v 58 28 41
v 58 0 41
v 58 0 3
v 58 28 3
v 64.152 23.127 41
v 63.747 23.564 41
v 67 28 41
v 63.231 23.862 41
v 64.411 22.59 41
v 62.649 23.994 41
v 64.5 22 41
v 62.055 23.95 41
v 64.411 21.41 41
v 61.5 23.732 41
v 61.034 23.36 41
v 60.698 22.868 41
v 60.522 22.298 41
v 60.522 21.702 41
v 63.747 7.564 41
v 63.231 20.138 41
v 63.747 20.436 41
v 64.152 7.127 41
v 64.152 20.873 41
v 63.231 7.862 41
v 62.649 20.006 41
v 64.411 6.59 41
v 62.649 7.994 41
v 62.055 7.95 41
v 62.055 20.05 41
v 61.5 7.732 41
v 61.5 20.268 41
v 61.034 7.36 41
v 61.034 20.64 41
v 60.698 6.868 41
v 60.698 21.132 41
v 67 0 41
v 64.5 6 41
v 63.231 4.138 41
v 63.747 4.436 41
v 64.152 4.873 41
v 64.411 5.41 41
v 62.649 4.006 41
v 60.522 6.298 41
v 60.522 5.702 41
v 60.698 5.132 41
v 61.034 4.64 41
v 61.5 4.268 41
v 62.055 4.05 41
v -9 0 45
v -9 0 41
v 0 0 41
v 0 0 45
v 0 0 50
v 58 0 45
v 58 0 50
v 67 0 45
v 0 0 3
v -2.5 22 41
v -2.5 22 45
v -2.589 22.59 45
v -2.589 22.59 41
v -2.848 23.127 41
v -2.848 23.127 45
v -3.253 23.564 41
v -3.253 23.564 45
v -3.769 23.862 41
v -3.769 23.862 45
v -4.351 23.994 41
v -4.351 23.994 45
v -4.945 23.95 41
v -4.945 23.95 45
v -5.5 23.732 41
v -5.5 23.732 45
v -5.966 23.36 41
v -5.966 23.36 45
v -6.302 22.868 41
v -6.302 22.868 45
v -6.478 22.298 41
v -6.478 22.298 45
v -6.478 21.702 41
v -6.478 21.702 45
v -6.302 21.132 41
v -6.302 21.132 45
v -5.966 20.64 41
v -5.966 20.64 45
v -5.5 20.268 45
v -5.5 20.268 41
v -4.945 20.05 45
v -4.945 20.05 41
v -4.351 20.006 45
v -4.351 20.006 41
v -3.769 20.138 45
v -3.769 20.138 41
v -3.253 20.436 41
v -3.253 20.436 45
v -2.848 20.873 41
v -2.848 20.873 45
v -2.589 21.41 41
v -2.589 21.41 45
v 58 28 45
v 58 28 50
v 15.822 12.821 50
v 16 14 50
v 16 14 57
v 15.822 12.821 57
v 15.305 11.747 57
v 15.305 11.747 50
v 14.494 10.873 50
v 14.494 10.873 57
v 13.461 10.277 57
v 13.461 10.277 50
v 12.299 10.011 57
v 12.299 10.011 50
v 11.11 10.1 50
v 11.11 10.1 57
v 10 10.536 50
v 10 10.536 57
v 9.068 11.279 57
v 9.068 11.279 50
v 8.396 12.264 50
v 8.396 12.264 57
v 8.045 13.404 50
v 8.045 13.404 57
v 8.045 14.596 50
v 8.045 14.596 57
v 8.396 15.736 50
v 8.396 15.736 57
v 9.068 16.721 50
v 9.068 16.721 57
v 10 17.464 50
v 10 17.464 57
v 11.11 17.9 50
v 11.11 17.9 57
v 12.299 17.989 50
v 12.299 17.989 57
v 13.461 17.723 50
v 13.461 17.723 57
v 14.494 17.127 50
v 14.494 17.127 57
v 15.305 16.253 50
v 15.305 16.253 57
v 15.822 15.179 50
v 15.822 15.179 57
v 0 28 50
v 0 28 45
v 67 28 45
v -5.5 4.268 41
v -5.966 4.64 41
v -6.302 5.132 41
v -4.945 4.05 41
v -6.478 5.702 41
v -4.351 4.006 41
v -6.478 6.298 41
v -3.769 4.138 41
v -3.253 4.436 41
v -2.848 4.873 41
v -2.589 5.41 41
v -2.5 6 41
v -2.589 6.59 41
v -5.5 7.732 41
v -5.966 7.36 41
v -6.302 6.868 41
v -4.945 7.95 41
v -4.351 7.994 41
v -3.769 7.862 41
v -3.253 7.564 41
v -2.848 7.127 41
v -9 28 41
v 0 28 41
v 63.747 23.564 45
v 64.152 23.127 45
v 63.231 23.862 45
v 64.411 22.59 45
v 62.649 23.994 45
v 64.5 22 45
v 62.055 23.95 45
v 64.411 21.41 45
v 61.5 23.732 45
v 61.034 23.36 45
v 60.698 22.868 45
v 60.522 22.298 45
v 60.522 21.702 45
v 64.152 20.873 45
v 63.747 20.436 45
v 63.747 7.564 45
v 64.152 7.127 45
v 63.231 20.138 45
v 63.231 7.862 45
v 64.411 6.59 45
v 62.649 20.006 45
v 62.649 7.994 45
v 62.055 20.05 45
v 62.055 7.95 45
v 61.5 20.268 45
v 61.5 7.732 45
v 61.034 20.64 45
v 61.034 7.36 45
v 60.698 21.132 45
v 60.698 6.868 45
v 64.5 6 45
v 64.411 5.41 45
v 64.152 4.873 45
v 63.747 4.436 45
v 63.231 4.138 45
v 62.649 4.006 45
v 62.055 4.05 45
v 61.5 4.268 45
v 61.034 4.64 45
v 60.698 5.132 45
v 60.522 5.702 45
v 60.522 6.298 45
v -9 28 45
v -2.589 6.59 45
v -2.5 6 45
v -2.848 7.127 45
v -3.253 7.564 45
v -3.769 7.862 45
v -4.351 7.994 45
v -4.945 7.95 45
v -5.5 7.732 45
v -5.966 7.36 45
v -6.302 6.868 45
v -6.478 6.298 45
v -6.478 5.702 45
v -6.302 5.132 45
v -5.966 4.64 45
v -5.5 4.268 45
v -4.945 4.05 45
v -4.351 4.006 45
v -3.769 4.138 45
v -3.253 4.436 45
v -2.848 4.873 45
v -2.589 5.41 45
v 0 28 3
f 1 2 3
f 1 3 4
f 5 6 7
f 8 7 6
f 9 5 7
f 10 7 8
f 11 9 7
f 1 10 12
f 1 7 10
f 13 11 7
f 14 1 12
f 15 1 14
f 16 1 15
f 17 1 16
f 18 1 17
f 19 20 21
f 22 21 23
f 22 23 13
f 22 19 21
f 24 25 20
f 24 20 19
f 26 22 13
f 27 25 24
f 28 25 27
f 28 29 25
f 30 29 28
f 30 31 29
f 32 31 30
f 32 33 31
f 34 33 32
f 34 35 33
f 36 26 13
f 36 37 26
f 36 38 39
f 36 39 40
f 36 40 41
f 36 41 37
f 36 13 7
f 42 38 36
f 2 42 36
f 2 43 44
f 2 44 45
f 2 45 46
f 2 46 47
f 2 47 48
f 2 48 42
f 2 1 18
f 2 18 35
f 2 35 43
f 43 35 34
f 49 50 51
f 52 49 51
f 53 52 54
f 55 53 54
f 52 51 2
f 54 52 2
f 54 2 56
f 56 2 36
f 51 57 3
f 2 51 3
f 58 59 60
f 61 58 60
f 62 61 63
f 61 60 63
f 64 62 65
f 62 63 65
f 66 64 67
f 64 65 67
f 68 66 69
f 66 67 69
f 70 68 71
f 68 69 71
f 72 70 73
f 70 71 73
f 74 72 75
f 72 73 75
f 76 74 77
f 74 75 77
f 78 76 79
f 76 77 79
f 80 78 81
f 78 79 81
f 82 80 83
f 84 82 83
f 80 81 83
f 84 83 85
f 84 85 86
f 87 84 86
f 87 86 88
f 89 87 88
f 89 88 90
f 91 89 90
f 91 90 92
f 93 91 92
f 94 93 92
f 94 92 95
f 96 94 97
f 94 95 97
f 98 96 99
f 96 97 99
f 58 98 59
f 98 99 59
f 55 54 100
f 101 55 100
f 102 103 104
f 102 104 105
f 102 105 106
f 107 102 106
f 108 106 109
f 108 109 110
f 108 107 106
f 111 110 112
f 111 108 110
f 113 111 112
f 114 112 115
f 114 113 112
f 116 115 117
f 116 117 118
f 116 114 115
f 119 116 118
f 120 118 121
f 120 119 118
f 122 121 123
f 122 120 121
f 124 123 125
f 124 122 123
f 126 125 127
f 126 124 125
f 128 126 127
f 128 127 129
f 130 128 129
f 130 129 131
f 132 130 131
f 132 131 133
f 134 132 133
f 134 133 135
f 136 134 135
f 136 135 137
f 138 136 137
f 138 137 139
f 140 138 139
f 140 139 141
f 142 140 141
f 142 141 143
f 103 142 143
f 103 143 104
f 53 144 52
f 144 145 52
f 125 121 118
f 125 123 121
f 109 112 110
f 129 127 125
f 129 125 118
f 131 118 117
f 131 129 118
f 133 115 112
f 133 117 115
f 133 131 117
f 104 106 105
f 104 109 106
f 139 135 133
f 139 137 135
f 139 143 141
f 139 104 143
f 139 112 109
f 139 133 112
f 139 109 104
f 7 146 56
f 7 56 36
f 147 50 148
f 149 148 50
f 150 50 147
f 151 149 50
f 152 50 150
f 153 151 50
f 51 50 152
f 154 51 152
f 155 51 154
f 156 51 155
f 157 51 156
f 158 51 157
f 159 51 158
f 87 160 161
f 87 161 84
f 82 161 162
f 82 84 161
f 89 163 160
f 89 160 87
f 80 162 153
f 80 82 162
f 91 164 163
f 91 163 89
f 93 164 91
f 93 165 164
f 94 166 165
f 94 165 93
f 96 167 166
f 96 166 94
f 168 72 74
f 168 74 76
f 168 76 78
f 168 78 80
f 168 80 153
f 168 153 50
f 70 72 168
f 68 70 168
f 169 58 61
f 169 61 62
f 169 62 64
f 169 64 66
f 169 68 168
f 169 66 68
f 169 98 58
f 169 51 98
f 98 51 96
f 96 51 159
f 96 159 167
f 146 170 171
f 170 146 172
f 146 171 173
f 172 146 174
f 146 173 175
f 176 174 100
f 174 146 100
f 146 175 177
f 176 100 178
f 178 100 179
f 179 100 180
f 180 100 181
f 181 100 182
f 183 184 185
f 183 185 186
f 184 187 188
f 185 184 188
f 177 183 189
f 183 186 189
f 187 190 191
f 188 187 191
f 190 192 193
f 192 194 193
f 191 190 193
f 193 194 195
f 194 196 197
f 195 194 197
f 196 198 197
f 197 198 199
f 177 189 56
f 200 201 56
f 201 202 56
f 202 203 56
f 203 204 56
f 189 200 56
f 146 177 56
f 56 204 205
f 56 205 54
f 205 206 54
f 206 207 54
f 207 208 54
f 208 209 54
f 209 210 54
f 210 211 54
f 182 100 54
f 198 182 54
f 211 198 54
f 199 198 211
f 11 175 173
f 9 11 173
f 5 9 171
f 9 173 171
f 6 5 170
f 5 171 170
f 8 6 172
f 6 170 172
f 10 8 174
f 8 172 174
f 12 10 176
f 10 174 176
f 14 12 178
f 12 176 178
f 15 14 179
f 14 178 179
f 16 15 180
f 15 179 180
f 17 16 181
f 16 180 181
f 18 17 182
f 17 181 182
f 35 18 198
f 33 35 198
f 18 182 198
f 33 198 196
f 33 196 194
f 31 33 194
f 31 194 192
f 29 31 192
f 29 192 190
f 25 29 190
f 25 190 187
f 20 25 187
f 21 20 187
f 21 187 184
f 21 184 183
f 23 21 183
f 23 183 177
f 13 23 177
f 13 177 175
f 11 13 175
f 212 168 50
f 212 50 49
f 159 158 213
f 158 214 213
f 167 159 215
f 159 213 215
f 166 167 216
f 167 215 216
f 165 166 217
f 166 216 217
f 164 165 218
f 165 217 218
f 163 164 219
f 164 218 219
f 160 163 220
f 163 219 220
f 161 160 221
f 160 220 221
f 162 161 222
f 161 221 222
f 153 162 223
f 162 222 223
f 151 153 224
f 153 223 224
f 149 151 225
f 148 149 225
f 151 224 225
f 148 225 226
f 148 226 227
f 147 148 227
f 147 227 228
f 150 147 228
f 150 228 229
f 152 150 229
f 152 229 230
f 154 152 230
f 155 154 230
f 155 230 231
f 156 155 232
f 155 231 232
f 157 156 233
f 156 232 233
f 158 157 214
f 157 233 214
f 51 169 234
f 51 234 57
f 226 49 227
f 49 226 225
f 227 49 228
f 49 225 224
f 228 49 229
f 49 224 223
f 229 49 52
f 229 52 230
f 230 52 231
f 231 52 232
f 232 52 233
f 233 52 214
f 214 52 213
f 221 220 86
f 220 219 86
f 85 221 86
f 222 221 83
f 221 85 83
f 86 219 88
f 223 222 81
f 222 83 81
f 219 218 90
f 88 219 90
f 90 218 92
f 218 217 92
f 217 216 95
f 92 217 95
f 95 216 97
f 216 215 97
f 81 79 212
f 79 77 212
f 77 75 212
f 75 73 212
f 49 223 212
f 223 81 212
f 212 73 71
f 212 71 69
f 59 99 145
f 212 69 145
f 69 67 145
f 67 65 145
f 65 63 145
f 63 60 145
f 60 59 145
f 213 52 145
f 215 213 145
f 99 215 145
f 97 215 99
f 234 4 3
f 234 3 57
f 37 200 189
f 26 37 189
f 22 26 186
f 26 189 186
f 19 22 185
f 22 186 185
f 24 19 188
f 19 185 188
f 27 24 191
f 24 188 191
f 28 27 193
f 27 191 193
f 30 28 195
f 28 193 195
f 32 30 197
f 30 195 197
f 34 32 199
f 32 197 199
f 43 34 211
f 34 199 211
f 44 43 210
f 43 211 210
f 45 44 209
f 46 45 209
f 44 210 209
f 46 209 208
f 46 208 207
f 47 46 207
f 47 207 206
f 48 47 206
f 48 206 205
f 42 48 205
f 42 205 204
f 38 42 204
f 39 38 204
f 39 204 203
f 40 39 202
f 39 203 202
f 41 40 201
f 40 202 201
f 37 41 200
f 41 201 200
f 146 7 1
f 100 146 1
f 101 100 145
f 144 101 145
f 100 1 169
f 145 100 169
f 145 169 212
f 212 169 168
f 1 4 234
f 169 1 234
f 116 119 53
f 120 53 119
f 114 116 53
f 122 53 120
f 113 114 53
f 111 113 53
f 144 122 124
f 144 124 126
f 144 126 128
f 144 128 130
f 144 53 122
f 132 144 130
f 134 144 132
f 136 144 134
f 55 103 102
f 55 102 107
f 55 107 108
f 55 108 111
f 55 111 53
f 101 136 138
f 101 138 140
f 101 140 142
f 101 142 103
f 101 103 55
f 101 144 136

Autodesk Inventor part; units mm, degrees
ref_plane "YZ Plane" through (0, 0, 0) normal (1, 0, 0) x (0, 1, 0)
ref_plane "XZ Plane" through (0, 0, 0) normal (0, 1, 0) x (-1, 0, 0)
sketch "Sketch1" plane through (0, 0, 0) normal (0, 0, 1) x (1, 0, 0)
  line L0 (0, 0) -> (58, 0)
  line L1 (58, 0) -> (58, 28)
  line L2 (58, 28) -> (0, 28)
  line L3 (0, 28) -> (0, 0)
  dimension "d0" = 58
  dimension "d1" = 28
extrude "Extrusion1" add sketch "Sketch1" along normal blind 50
sketch "Sketch2" plane through (58, 0, 0) normal (1, 0, 0) x (0, 0, -1)
  line L0 (0, 28) -> (-50, 28) projected
  line L1 (0, 0) -> (-50, 0) projected
  line L2 (-50, 28) -> (-45, 28)
  line L3 (-45, 28) -> (-45, 0)
  line L4 (-45, 28) -> (-41, 28)
  line L5 (-41, 28) -> (-41, 0)
  line L6 (-41, 0) -> (-45, 0)
  line L7 (-45, 0) -> (-45, 28)
  dimension "d4" = 5
  dimension "d5" = 4
extrude "Extrusion2" add sketch "Sketch2" along normal blind 9
ref_plane "Work Plane1" through (29, 0, 0) normal (-1, 0, 0) x (0, 0, 1)
mirror "Mirror1" about plane through (29, 0, 0) normal (-1, 0, 0) of "Extrusion2"
sketch "Sketch3" plane through (-9, 28, 45) normal (0, 0, 1) x (1, 0, 0)
  line L0 (9, 0) -> (0, 0) projected
  line L1 (4.5, 0) -> (4.5, -6)
  line L2 (9, -28) -> (0, -28) projected
  line L3 (4.5, -6) -> (4.5, -22)
  circle A0 centre (4.5, -6) radius 2
  circle A1 centre (4.5, -22) radius 2
  dimension "d8" = 6
  dimension "d9" = 16
  dimension "d10" = 4
  dimension "d11" = 4
extrude "Extrusion3" cut sketch "Sketch3" against normal blind 9
sketch "Sketch4" plane through (58, 0, 45) normal (0, 0, 1) x (1, 0, 0)
  circle A0 centre (-62.5, 22) radius 2 projected
  line L0 (-62.5, 22) -> (4.5, 22)
  line L1 (4.5, 22) -> (4.5, 6)
  circle A1 centre (4.5, 22) radius 2
  circle A2 centre (4.5, 6) radius 2
  point P0 (-58, 0)
  dimension "d14" = 16
  dimension "d15" = 4
  dimension "d16" = 4
extrude "Extrusion4" cut sketch "Sketch4" against normal blind 9 contours A2 | A1 L1 L0 | L0 L1 A1
sketch "Sketch5" plane through (0, 0, 50) normal (0, 0, 1) x (1, 0, 0)
  line L0 (0, 28) -> (0, 0) projected
  line L1 (0, 14) -> (12, 14)
  circle A0 centre (12, 14) radius 4
  dimension "d19" = 12
  dimension "d20" = 8
extrude "Extrusion5" add sketch "Sketch5" along normal blind 7
sketch "Sketch6" plane through (0, 0, 0) normal (0, 0, -1) x (-1, 0, 0)
  line L0 (0, 0) -> (-58, 0) projected
  line L1 (0, 28) -> (0, 0) projected
  line L2 (-58, 28) -> (0, 28) projected
  line L3 (-58, 0) -> (-58, 28) projected
extrude "Extrusion6" cut sketch "Sketch6" against normal blind 3
properties part number "Shoulder Servo"
